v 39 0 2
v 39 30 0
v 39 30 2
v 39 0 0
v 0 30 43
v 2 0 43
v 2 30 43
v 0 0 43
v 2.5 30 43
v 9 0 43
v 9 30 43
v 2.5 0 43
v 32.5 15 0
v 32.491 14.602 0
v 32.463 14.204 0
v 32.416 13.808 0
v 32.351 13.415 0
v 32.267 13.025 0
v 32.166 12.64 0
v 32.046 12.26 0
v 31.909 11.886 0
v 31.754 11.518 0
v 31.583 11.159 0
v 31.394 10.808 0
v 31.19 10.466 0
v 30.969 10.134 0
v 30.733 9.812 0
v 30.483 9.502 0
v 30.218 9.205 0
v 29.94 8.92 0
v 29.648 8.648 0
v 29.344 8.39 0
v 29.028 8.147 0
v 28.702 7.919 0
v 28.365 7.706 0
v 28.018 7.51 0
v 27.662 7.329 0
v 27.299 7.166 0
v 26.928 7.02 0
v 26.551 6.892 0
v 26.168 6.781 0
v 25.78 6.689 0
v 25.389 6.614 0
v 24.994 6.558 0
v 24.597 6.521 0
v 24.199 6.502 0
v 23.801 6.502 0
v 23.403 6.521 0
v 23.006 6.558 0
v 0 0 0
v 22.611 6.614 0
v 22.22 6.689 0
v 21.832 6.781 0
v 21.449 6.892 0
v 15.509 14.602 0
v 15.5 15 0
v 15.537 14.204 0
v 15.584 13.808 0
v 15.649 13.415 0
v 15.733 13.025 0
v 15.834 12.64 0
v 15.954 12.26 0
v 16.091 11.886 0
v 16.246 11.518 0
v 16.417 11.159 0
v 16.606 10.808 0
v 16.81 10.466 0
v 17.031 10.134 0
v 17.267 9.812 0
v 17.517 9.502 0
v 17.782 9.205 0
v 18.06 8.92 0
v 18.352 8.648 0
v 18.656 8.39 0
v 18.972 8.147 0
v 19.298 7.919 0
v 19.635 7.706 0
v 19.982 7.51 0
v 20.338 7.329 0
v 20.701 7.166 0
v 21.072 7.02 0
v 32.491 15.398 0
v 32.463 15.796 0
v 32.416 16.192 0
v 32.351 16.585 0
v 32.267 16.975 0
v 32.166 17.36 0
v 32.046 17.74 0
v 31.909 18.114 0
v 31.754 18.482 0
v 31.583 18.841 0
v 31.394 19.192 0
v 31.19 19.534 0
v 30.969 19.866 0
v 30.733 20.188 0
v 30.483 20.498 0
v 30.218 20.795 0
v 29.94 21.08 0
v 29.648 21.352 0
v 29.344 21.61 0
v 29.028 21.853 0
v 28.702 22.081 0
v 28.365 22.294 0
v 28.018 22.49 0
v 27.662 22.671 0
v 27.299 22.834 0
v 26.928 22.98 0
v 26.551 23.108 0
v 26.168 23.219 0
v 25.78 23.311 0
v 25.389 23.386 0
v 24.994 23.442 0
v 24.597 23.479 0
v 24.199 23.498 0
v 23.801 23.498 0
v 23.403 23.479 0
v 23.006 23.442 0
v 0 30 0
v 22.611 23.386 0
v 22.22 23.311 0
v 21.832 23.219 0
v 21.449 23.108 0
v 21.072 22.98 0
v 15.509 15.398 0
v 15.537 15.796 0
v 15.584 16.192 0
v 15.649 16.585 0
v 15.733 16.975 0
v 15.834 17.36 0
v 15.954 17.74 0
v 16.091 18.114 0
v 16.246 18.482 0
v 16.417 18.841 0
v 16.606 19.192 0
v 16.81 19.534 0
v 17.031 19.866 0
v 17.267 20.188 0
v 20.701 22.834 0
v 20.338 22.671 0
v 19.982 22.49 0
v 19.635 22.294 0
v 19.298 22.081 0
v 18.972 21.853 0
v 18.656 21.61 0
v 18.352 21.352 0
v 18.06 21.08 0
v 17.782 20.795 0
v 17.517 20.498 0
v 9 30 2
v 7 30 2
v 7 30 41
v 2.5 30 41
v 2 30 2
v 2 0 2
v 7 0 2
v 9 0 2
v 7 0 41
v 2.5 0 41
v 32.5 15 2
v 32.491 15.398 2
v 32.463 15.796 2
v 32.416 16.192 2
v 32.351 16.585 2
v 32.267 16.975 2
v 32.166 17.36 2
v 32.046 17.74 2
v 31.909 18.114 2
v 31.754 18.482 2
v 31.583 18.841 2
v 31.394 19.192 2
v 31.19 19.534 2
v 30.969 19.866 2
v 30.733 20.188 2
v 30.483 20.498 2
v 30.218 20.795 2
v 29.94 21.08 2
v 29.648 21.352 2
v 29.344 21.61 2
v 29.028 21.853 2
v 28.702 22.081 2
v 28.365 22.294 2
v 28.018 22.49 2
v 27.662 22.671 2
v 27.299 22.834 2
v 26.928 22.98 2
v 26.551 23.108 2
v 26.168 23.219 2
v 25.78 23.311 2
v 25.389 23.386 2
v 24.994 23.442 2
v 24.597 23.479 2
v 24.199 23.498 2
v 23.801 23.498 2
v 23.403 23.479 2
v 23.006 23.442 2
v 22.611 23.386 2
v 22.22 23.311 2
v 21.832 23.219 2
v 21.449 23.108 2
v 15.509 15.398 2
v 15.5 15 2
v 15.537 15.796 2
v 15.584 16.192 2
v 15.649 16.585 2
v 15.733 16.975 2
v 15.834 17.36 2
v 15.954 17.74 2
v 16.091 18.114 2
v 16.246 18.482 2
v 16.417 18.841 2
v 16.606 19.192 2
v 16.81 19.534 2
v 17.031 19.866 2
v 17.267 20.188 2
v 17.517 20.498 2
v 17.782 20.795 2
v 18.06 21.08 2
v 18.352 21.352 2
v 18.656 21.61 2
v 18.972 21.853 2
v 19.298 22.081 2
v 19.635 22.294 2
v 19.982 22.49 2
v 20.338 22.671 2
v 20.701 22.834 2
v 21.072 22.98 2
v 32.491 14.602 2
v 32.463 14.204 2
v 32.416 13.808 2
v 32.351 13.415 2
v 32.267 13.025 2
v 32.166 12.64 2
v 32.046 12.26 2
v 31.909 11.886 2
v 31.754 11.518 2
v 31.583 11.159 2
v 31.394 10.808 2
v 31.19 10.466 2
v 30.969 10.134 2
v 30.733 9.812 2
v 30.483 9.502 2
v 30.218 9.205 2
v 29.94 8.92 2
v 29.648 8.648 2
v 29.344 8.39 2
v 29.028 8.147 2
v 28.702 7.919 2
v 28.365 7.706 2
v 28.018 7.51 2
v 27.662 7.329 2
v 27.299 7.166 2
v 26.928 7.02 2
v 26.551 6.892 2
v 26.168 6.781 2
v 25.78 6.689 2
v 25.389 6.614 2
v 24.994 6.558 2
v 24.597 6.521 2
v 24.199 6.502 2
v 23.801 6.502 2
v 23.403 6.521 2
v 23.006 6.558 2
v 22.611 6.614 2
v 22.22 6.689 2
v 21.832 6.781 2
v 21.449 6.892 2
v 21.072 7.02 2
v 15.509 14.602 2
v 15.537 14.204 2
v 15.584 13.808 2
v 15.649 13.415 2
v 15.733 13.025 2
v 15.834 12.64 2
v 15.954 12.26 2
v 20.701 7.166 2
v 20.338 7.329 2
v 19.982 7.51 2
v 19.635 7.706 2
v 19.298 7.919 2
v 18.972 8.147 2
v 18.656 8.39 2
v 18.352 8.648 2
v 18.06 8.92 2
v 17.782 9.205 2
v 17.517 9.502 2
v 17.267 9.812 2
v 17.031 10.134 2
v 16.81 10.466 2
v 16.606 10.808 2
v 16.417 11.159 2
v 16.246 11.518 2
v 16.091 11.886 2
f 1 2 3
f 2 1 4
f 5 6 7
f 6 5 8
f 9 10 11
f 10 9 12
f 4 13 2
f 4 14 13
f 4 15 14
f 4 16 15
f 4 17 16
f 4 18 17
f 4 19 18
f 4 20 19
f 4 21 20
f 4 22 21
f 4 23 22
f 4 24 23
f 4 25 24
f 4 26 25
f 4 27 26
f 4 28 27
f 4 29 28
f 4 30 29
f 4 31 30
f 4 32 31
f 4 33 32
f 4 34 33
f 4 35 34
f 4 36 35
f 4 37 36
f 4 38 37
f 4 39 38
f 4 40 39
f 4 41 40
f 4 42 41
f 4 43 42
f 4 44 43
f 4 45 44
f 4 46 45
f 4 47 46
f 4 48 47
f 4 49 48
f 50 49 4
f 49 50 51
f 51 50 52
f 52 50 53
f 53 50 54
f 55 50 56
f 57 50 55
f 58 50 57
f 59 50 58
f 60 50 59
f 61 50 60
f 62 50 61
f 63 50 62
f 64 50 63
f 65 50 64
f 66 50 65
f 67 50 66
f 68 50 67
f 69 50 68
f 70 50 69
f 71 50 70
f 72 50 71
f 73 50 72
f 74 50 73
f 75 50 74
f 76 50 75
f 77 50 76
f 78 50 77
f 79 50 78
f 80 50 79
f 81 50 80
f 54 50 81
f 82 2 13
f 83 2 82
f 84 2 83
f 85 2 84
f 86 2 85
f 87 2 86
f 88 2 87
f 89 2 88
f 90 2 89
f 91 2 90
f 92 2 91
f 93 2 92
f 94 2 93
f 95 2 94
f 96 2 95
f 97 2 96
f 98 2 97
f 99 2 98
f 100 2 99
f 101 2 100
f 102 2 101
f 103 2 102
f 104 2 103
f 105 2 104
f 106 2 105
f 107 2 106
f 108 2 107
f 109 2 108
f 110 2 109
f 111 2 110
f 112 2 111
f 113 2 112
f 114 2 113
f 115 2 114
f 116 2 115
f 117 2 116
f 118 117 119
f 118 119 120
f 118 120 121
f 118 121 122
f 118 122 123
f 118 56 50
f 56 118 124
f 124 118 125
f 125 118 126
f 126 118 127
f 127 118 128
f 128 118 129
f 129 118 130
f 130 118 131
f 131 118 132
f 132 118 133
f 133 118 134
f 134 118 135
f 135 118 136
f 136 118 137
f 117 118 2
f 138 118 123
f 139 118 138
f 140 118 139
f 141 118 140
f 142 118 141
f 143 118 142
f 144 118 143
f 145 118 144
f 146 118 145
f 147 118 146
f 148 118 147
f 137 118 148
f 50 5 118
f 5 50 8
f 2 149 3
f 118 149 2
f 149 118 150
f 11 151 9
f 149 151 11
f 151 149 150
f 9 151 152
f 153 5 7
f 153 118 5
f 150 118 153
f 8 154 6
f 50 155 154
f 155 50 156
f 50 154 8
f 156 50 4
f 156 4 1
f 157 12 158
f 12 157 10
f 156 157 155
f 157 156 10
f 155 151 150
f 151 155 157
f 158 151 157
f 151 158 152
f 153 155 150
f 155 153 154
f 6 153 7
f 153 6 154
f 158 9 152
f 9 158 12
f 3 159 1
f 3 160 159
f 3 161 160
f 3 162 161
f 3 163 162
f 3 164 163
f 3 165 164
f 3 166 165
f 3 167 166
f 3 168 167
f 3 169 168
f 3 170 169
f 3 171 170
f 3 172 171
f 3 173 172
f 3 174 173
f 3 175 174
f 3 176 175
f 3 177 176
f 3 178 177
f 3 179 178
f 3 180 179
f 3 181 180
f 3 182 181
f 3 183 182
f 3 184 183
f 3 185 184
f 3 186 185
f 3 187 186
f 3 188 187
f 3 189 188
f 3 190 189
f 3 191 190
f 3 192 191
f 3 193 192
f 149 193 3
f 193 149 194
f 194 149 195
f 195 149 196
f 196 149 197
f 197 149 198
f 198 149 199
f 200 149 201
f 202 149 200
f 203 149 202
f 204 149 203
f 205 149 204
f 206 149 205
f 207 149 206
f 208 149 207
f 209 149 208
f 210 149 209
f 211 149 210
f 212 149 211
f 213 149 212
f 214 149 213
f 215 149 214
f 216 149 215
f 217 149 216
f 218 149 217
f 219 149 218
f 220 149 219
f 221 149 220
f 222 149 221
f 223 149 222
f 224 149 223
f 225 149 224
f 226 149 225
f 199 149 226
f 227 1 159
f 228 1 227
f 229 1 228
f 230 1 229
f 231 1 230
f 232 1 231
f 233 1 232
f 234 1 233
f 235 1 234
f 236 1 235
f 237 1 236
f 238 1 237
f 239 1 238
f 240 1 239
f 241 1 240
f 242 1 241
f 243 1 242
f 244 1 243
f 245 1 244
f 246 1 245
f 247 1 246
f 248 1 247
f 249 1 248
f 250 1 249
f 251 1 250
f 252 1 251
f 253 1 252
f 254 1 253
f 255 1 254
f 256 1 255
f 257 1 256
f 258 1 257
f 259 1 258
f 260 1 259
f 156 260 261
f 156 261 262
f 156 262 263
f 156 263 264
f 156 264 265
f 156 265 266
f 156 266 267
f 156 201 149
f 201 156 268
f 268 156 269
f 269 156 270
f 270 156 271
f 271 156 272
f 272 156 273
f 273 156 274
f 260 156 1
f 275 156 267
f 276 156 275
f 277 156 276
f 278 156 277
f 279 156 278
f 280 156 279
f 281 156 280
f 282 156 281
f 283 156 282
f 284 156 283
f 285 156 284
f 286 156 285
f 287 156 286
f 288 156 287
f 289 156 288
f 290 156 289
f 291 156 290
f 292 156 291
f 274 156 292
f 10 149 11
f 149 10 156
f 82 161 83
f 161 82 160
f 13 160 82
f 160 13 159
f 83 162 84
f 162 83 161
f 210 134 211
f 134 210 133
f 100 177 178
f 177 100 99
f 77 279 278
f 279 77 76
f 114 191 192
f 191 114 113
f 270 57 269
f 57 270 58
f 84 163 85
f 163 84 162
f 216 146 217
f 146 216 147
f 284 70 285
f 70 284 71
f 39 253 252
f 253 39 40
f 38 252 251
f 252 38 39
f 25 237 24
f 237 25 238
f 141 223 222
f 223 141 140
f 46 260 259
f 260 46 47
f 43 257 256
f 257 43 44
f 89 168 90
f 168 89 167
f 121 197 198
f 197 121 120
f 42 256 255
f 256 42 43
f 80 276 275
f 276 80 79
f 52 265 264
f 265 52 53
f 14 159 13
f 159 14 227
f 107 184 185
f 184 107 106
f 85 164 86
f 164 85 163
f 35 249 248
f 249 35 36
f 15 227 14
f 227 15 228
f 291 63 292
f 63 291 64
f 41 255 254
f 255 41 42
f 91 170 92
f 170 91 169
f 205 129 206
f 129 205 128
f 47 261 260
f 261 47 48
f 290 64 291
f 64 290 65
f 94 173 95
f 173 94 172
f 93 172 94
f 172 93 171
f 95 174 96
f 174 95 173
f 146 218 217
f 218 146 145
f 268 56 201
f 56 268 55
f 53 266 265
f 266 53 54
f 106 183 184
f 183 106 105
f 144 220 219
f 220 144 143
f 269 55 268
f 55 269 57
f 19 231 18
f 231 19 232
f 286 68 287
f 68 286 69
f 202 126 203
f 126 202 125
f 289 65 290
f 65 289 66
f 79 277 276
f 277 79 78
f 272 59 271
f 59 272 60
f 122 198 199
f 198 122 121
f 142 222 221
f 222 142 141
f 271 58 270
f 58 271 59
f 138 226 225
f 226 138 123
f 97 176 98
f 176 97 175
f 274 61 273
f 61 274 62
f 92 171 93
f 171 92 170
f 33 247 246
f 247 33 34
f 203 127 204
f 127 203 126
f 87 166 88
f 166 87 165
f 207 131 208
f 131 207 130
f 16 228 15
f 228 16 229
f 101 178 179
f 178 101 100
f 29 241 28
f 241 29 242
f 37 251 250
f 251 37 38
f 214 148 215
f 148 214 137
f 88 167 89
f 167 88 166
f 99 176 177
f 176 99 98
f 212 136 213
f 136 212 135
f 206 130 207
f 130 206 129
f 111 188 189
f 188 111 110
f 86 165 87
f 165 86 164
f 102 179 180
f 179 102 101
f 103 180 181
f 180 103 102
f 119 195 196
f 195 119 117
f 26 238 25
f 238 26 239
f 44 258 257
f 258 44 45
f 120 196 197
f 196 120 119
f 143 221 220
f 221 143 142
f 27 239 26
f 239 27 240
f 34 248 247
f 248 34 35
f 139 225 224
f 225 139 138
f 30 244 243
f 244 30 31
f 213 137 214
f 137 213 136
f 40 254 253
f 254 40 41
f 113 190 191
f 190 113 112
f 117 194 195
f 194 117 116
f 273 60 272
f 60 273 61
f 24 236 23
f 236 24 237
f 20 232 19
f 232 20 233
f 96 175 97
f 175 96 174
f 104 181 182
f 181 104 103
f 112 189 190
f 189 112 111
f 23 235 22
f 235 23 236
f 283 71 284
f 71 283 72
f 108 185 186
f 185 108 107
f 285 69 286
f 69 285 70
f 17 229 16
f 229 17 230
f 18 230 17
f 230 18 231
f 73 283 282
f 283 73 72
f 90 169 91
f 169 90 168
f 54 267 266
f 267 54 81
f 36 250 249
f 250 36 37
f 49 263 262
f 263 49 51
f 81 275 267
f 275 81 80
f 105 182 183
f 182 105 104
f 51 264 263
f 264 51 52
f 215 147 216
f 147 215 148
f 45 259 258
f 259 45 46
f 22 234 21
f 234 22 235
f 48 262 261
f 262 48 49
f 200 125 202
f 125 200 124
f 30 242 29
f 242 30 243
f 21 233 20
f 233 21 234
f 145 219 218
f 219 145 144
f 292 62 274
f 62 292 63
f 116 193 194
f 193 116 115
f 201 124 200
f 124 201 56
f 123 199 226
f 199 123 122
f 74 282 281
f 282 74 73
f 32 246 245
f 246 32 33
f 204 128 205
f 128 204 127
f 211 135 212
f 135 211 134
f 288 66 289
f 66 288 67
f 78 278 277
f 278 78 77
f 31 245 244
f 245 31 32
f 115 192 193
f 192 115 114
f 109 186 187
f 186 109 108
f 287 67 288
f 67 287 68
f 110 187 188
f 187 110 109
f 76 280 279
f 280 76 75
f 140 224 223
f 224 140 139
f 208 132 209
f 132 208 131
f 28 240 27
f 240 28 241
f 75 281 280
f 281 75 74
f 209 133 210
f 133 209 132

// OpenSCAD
/*
Creator
*****************
Constantin Ganshin

Project name:
*****************
Tooth_brush_Holder_With_Clip_V2

Description:
****************************************

With square toothbrush holder and a clip that intent to be on top of metal frame of the shampoo holder

            -----------------|----------|----
            |         |            
            |         |
            |         |
            |         |
            |         |
            |         |
            |         |
            |         |
            |         |
            |         |
            |         |


Printed in PETG (for water resistance)

*/

// Resolution variables
$fa = 1;
$fs = 0.4;

// Main dimension variables

hightZ = 43;
holderGapX = 5; //The place that will on top of the metal bar
toothbrushHolderLengthWidth = 30;
wallThikness = 2;
holeForToothbrushD = 17;
clip_opennig_gap_x = holderGapX - 4.5;
fullBodyLengthX = (wallThikness * 2) + holderGapX + toothbrushHolderLengthWidth;
holeForToothbrushR = holeForToothbrushD / 2;

// Main

module toothbrushHolderWithClip(){
    difference(){
        cube([fullBodyLengthX, toothbrushHolderLengthWidth, hightZ]);

        // Clip
        translate([wallThikness, -1, wallThikness])
            cube([holderGapX, toothbrushHolderLengthWidth * 2, hightZ - (wallThikness * 2)]);
        
        // Clip openning gap
        translate([wallThikness, -1, hightZ - (wallThikness * 2) -1])
            cube([clip_opennig_gap_x, toothbrushHolderLengthWidth + 2, (wallThikness * 2) + 2]);

        // Toothbrush holder
        translate([fullBodyLengthX - toothbrushHolderLengthWidth
    , -1, wallThikness])
            cube([toothbrushHolderLengthWidth * 2, toothbrushHolderLengthWidth * 2, hightZ * 2]);

        // Toothbrush holder hole
        translate([fullBodyLengthX - (toothbrushHolderLengthWidth / 2),toothbrushHolderLengthWidth / 2, -1])
            cylinder(r = holeForToothbrushR, h = wallThikness * 2);
    }
}

// Generate the toothbrush holder with clip
toothbrushHolderWithClip();
